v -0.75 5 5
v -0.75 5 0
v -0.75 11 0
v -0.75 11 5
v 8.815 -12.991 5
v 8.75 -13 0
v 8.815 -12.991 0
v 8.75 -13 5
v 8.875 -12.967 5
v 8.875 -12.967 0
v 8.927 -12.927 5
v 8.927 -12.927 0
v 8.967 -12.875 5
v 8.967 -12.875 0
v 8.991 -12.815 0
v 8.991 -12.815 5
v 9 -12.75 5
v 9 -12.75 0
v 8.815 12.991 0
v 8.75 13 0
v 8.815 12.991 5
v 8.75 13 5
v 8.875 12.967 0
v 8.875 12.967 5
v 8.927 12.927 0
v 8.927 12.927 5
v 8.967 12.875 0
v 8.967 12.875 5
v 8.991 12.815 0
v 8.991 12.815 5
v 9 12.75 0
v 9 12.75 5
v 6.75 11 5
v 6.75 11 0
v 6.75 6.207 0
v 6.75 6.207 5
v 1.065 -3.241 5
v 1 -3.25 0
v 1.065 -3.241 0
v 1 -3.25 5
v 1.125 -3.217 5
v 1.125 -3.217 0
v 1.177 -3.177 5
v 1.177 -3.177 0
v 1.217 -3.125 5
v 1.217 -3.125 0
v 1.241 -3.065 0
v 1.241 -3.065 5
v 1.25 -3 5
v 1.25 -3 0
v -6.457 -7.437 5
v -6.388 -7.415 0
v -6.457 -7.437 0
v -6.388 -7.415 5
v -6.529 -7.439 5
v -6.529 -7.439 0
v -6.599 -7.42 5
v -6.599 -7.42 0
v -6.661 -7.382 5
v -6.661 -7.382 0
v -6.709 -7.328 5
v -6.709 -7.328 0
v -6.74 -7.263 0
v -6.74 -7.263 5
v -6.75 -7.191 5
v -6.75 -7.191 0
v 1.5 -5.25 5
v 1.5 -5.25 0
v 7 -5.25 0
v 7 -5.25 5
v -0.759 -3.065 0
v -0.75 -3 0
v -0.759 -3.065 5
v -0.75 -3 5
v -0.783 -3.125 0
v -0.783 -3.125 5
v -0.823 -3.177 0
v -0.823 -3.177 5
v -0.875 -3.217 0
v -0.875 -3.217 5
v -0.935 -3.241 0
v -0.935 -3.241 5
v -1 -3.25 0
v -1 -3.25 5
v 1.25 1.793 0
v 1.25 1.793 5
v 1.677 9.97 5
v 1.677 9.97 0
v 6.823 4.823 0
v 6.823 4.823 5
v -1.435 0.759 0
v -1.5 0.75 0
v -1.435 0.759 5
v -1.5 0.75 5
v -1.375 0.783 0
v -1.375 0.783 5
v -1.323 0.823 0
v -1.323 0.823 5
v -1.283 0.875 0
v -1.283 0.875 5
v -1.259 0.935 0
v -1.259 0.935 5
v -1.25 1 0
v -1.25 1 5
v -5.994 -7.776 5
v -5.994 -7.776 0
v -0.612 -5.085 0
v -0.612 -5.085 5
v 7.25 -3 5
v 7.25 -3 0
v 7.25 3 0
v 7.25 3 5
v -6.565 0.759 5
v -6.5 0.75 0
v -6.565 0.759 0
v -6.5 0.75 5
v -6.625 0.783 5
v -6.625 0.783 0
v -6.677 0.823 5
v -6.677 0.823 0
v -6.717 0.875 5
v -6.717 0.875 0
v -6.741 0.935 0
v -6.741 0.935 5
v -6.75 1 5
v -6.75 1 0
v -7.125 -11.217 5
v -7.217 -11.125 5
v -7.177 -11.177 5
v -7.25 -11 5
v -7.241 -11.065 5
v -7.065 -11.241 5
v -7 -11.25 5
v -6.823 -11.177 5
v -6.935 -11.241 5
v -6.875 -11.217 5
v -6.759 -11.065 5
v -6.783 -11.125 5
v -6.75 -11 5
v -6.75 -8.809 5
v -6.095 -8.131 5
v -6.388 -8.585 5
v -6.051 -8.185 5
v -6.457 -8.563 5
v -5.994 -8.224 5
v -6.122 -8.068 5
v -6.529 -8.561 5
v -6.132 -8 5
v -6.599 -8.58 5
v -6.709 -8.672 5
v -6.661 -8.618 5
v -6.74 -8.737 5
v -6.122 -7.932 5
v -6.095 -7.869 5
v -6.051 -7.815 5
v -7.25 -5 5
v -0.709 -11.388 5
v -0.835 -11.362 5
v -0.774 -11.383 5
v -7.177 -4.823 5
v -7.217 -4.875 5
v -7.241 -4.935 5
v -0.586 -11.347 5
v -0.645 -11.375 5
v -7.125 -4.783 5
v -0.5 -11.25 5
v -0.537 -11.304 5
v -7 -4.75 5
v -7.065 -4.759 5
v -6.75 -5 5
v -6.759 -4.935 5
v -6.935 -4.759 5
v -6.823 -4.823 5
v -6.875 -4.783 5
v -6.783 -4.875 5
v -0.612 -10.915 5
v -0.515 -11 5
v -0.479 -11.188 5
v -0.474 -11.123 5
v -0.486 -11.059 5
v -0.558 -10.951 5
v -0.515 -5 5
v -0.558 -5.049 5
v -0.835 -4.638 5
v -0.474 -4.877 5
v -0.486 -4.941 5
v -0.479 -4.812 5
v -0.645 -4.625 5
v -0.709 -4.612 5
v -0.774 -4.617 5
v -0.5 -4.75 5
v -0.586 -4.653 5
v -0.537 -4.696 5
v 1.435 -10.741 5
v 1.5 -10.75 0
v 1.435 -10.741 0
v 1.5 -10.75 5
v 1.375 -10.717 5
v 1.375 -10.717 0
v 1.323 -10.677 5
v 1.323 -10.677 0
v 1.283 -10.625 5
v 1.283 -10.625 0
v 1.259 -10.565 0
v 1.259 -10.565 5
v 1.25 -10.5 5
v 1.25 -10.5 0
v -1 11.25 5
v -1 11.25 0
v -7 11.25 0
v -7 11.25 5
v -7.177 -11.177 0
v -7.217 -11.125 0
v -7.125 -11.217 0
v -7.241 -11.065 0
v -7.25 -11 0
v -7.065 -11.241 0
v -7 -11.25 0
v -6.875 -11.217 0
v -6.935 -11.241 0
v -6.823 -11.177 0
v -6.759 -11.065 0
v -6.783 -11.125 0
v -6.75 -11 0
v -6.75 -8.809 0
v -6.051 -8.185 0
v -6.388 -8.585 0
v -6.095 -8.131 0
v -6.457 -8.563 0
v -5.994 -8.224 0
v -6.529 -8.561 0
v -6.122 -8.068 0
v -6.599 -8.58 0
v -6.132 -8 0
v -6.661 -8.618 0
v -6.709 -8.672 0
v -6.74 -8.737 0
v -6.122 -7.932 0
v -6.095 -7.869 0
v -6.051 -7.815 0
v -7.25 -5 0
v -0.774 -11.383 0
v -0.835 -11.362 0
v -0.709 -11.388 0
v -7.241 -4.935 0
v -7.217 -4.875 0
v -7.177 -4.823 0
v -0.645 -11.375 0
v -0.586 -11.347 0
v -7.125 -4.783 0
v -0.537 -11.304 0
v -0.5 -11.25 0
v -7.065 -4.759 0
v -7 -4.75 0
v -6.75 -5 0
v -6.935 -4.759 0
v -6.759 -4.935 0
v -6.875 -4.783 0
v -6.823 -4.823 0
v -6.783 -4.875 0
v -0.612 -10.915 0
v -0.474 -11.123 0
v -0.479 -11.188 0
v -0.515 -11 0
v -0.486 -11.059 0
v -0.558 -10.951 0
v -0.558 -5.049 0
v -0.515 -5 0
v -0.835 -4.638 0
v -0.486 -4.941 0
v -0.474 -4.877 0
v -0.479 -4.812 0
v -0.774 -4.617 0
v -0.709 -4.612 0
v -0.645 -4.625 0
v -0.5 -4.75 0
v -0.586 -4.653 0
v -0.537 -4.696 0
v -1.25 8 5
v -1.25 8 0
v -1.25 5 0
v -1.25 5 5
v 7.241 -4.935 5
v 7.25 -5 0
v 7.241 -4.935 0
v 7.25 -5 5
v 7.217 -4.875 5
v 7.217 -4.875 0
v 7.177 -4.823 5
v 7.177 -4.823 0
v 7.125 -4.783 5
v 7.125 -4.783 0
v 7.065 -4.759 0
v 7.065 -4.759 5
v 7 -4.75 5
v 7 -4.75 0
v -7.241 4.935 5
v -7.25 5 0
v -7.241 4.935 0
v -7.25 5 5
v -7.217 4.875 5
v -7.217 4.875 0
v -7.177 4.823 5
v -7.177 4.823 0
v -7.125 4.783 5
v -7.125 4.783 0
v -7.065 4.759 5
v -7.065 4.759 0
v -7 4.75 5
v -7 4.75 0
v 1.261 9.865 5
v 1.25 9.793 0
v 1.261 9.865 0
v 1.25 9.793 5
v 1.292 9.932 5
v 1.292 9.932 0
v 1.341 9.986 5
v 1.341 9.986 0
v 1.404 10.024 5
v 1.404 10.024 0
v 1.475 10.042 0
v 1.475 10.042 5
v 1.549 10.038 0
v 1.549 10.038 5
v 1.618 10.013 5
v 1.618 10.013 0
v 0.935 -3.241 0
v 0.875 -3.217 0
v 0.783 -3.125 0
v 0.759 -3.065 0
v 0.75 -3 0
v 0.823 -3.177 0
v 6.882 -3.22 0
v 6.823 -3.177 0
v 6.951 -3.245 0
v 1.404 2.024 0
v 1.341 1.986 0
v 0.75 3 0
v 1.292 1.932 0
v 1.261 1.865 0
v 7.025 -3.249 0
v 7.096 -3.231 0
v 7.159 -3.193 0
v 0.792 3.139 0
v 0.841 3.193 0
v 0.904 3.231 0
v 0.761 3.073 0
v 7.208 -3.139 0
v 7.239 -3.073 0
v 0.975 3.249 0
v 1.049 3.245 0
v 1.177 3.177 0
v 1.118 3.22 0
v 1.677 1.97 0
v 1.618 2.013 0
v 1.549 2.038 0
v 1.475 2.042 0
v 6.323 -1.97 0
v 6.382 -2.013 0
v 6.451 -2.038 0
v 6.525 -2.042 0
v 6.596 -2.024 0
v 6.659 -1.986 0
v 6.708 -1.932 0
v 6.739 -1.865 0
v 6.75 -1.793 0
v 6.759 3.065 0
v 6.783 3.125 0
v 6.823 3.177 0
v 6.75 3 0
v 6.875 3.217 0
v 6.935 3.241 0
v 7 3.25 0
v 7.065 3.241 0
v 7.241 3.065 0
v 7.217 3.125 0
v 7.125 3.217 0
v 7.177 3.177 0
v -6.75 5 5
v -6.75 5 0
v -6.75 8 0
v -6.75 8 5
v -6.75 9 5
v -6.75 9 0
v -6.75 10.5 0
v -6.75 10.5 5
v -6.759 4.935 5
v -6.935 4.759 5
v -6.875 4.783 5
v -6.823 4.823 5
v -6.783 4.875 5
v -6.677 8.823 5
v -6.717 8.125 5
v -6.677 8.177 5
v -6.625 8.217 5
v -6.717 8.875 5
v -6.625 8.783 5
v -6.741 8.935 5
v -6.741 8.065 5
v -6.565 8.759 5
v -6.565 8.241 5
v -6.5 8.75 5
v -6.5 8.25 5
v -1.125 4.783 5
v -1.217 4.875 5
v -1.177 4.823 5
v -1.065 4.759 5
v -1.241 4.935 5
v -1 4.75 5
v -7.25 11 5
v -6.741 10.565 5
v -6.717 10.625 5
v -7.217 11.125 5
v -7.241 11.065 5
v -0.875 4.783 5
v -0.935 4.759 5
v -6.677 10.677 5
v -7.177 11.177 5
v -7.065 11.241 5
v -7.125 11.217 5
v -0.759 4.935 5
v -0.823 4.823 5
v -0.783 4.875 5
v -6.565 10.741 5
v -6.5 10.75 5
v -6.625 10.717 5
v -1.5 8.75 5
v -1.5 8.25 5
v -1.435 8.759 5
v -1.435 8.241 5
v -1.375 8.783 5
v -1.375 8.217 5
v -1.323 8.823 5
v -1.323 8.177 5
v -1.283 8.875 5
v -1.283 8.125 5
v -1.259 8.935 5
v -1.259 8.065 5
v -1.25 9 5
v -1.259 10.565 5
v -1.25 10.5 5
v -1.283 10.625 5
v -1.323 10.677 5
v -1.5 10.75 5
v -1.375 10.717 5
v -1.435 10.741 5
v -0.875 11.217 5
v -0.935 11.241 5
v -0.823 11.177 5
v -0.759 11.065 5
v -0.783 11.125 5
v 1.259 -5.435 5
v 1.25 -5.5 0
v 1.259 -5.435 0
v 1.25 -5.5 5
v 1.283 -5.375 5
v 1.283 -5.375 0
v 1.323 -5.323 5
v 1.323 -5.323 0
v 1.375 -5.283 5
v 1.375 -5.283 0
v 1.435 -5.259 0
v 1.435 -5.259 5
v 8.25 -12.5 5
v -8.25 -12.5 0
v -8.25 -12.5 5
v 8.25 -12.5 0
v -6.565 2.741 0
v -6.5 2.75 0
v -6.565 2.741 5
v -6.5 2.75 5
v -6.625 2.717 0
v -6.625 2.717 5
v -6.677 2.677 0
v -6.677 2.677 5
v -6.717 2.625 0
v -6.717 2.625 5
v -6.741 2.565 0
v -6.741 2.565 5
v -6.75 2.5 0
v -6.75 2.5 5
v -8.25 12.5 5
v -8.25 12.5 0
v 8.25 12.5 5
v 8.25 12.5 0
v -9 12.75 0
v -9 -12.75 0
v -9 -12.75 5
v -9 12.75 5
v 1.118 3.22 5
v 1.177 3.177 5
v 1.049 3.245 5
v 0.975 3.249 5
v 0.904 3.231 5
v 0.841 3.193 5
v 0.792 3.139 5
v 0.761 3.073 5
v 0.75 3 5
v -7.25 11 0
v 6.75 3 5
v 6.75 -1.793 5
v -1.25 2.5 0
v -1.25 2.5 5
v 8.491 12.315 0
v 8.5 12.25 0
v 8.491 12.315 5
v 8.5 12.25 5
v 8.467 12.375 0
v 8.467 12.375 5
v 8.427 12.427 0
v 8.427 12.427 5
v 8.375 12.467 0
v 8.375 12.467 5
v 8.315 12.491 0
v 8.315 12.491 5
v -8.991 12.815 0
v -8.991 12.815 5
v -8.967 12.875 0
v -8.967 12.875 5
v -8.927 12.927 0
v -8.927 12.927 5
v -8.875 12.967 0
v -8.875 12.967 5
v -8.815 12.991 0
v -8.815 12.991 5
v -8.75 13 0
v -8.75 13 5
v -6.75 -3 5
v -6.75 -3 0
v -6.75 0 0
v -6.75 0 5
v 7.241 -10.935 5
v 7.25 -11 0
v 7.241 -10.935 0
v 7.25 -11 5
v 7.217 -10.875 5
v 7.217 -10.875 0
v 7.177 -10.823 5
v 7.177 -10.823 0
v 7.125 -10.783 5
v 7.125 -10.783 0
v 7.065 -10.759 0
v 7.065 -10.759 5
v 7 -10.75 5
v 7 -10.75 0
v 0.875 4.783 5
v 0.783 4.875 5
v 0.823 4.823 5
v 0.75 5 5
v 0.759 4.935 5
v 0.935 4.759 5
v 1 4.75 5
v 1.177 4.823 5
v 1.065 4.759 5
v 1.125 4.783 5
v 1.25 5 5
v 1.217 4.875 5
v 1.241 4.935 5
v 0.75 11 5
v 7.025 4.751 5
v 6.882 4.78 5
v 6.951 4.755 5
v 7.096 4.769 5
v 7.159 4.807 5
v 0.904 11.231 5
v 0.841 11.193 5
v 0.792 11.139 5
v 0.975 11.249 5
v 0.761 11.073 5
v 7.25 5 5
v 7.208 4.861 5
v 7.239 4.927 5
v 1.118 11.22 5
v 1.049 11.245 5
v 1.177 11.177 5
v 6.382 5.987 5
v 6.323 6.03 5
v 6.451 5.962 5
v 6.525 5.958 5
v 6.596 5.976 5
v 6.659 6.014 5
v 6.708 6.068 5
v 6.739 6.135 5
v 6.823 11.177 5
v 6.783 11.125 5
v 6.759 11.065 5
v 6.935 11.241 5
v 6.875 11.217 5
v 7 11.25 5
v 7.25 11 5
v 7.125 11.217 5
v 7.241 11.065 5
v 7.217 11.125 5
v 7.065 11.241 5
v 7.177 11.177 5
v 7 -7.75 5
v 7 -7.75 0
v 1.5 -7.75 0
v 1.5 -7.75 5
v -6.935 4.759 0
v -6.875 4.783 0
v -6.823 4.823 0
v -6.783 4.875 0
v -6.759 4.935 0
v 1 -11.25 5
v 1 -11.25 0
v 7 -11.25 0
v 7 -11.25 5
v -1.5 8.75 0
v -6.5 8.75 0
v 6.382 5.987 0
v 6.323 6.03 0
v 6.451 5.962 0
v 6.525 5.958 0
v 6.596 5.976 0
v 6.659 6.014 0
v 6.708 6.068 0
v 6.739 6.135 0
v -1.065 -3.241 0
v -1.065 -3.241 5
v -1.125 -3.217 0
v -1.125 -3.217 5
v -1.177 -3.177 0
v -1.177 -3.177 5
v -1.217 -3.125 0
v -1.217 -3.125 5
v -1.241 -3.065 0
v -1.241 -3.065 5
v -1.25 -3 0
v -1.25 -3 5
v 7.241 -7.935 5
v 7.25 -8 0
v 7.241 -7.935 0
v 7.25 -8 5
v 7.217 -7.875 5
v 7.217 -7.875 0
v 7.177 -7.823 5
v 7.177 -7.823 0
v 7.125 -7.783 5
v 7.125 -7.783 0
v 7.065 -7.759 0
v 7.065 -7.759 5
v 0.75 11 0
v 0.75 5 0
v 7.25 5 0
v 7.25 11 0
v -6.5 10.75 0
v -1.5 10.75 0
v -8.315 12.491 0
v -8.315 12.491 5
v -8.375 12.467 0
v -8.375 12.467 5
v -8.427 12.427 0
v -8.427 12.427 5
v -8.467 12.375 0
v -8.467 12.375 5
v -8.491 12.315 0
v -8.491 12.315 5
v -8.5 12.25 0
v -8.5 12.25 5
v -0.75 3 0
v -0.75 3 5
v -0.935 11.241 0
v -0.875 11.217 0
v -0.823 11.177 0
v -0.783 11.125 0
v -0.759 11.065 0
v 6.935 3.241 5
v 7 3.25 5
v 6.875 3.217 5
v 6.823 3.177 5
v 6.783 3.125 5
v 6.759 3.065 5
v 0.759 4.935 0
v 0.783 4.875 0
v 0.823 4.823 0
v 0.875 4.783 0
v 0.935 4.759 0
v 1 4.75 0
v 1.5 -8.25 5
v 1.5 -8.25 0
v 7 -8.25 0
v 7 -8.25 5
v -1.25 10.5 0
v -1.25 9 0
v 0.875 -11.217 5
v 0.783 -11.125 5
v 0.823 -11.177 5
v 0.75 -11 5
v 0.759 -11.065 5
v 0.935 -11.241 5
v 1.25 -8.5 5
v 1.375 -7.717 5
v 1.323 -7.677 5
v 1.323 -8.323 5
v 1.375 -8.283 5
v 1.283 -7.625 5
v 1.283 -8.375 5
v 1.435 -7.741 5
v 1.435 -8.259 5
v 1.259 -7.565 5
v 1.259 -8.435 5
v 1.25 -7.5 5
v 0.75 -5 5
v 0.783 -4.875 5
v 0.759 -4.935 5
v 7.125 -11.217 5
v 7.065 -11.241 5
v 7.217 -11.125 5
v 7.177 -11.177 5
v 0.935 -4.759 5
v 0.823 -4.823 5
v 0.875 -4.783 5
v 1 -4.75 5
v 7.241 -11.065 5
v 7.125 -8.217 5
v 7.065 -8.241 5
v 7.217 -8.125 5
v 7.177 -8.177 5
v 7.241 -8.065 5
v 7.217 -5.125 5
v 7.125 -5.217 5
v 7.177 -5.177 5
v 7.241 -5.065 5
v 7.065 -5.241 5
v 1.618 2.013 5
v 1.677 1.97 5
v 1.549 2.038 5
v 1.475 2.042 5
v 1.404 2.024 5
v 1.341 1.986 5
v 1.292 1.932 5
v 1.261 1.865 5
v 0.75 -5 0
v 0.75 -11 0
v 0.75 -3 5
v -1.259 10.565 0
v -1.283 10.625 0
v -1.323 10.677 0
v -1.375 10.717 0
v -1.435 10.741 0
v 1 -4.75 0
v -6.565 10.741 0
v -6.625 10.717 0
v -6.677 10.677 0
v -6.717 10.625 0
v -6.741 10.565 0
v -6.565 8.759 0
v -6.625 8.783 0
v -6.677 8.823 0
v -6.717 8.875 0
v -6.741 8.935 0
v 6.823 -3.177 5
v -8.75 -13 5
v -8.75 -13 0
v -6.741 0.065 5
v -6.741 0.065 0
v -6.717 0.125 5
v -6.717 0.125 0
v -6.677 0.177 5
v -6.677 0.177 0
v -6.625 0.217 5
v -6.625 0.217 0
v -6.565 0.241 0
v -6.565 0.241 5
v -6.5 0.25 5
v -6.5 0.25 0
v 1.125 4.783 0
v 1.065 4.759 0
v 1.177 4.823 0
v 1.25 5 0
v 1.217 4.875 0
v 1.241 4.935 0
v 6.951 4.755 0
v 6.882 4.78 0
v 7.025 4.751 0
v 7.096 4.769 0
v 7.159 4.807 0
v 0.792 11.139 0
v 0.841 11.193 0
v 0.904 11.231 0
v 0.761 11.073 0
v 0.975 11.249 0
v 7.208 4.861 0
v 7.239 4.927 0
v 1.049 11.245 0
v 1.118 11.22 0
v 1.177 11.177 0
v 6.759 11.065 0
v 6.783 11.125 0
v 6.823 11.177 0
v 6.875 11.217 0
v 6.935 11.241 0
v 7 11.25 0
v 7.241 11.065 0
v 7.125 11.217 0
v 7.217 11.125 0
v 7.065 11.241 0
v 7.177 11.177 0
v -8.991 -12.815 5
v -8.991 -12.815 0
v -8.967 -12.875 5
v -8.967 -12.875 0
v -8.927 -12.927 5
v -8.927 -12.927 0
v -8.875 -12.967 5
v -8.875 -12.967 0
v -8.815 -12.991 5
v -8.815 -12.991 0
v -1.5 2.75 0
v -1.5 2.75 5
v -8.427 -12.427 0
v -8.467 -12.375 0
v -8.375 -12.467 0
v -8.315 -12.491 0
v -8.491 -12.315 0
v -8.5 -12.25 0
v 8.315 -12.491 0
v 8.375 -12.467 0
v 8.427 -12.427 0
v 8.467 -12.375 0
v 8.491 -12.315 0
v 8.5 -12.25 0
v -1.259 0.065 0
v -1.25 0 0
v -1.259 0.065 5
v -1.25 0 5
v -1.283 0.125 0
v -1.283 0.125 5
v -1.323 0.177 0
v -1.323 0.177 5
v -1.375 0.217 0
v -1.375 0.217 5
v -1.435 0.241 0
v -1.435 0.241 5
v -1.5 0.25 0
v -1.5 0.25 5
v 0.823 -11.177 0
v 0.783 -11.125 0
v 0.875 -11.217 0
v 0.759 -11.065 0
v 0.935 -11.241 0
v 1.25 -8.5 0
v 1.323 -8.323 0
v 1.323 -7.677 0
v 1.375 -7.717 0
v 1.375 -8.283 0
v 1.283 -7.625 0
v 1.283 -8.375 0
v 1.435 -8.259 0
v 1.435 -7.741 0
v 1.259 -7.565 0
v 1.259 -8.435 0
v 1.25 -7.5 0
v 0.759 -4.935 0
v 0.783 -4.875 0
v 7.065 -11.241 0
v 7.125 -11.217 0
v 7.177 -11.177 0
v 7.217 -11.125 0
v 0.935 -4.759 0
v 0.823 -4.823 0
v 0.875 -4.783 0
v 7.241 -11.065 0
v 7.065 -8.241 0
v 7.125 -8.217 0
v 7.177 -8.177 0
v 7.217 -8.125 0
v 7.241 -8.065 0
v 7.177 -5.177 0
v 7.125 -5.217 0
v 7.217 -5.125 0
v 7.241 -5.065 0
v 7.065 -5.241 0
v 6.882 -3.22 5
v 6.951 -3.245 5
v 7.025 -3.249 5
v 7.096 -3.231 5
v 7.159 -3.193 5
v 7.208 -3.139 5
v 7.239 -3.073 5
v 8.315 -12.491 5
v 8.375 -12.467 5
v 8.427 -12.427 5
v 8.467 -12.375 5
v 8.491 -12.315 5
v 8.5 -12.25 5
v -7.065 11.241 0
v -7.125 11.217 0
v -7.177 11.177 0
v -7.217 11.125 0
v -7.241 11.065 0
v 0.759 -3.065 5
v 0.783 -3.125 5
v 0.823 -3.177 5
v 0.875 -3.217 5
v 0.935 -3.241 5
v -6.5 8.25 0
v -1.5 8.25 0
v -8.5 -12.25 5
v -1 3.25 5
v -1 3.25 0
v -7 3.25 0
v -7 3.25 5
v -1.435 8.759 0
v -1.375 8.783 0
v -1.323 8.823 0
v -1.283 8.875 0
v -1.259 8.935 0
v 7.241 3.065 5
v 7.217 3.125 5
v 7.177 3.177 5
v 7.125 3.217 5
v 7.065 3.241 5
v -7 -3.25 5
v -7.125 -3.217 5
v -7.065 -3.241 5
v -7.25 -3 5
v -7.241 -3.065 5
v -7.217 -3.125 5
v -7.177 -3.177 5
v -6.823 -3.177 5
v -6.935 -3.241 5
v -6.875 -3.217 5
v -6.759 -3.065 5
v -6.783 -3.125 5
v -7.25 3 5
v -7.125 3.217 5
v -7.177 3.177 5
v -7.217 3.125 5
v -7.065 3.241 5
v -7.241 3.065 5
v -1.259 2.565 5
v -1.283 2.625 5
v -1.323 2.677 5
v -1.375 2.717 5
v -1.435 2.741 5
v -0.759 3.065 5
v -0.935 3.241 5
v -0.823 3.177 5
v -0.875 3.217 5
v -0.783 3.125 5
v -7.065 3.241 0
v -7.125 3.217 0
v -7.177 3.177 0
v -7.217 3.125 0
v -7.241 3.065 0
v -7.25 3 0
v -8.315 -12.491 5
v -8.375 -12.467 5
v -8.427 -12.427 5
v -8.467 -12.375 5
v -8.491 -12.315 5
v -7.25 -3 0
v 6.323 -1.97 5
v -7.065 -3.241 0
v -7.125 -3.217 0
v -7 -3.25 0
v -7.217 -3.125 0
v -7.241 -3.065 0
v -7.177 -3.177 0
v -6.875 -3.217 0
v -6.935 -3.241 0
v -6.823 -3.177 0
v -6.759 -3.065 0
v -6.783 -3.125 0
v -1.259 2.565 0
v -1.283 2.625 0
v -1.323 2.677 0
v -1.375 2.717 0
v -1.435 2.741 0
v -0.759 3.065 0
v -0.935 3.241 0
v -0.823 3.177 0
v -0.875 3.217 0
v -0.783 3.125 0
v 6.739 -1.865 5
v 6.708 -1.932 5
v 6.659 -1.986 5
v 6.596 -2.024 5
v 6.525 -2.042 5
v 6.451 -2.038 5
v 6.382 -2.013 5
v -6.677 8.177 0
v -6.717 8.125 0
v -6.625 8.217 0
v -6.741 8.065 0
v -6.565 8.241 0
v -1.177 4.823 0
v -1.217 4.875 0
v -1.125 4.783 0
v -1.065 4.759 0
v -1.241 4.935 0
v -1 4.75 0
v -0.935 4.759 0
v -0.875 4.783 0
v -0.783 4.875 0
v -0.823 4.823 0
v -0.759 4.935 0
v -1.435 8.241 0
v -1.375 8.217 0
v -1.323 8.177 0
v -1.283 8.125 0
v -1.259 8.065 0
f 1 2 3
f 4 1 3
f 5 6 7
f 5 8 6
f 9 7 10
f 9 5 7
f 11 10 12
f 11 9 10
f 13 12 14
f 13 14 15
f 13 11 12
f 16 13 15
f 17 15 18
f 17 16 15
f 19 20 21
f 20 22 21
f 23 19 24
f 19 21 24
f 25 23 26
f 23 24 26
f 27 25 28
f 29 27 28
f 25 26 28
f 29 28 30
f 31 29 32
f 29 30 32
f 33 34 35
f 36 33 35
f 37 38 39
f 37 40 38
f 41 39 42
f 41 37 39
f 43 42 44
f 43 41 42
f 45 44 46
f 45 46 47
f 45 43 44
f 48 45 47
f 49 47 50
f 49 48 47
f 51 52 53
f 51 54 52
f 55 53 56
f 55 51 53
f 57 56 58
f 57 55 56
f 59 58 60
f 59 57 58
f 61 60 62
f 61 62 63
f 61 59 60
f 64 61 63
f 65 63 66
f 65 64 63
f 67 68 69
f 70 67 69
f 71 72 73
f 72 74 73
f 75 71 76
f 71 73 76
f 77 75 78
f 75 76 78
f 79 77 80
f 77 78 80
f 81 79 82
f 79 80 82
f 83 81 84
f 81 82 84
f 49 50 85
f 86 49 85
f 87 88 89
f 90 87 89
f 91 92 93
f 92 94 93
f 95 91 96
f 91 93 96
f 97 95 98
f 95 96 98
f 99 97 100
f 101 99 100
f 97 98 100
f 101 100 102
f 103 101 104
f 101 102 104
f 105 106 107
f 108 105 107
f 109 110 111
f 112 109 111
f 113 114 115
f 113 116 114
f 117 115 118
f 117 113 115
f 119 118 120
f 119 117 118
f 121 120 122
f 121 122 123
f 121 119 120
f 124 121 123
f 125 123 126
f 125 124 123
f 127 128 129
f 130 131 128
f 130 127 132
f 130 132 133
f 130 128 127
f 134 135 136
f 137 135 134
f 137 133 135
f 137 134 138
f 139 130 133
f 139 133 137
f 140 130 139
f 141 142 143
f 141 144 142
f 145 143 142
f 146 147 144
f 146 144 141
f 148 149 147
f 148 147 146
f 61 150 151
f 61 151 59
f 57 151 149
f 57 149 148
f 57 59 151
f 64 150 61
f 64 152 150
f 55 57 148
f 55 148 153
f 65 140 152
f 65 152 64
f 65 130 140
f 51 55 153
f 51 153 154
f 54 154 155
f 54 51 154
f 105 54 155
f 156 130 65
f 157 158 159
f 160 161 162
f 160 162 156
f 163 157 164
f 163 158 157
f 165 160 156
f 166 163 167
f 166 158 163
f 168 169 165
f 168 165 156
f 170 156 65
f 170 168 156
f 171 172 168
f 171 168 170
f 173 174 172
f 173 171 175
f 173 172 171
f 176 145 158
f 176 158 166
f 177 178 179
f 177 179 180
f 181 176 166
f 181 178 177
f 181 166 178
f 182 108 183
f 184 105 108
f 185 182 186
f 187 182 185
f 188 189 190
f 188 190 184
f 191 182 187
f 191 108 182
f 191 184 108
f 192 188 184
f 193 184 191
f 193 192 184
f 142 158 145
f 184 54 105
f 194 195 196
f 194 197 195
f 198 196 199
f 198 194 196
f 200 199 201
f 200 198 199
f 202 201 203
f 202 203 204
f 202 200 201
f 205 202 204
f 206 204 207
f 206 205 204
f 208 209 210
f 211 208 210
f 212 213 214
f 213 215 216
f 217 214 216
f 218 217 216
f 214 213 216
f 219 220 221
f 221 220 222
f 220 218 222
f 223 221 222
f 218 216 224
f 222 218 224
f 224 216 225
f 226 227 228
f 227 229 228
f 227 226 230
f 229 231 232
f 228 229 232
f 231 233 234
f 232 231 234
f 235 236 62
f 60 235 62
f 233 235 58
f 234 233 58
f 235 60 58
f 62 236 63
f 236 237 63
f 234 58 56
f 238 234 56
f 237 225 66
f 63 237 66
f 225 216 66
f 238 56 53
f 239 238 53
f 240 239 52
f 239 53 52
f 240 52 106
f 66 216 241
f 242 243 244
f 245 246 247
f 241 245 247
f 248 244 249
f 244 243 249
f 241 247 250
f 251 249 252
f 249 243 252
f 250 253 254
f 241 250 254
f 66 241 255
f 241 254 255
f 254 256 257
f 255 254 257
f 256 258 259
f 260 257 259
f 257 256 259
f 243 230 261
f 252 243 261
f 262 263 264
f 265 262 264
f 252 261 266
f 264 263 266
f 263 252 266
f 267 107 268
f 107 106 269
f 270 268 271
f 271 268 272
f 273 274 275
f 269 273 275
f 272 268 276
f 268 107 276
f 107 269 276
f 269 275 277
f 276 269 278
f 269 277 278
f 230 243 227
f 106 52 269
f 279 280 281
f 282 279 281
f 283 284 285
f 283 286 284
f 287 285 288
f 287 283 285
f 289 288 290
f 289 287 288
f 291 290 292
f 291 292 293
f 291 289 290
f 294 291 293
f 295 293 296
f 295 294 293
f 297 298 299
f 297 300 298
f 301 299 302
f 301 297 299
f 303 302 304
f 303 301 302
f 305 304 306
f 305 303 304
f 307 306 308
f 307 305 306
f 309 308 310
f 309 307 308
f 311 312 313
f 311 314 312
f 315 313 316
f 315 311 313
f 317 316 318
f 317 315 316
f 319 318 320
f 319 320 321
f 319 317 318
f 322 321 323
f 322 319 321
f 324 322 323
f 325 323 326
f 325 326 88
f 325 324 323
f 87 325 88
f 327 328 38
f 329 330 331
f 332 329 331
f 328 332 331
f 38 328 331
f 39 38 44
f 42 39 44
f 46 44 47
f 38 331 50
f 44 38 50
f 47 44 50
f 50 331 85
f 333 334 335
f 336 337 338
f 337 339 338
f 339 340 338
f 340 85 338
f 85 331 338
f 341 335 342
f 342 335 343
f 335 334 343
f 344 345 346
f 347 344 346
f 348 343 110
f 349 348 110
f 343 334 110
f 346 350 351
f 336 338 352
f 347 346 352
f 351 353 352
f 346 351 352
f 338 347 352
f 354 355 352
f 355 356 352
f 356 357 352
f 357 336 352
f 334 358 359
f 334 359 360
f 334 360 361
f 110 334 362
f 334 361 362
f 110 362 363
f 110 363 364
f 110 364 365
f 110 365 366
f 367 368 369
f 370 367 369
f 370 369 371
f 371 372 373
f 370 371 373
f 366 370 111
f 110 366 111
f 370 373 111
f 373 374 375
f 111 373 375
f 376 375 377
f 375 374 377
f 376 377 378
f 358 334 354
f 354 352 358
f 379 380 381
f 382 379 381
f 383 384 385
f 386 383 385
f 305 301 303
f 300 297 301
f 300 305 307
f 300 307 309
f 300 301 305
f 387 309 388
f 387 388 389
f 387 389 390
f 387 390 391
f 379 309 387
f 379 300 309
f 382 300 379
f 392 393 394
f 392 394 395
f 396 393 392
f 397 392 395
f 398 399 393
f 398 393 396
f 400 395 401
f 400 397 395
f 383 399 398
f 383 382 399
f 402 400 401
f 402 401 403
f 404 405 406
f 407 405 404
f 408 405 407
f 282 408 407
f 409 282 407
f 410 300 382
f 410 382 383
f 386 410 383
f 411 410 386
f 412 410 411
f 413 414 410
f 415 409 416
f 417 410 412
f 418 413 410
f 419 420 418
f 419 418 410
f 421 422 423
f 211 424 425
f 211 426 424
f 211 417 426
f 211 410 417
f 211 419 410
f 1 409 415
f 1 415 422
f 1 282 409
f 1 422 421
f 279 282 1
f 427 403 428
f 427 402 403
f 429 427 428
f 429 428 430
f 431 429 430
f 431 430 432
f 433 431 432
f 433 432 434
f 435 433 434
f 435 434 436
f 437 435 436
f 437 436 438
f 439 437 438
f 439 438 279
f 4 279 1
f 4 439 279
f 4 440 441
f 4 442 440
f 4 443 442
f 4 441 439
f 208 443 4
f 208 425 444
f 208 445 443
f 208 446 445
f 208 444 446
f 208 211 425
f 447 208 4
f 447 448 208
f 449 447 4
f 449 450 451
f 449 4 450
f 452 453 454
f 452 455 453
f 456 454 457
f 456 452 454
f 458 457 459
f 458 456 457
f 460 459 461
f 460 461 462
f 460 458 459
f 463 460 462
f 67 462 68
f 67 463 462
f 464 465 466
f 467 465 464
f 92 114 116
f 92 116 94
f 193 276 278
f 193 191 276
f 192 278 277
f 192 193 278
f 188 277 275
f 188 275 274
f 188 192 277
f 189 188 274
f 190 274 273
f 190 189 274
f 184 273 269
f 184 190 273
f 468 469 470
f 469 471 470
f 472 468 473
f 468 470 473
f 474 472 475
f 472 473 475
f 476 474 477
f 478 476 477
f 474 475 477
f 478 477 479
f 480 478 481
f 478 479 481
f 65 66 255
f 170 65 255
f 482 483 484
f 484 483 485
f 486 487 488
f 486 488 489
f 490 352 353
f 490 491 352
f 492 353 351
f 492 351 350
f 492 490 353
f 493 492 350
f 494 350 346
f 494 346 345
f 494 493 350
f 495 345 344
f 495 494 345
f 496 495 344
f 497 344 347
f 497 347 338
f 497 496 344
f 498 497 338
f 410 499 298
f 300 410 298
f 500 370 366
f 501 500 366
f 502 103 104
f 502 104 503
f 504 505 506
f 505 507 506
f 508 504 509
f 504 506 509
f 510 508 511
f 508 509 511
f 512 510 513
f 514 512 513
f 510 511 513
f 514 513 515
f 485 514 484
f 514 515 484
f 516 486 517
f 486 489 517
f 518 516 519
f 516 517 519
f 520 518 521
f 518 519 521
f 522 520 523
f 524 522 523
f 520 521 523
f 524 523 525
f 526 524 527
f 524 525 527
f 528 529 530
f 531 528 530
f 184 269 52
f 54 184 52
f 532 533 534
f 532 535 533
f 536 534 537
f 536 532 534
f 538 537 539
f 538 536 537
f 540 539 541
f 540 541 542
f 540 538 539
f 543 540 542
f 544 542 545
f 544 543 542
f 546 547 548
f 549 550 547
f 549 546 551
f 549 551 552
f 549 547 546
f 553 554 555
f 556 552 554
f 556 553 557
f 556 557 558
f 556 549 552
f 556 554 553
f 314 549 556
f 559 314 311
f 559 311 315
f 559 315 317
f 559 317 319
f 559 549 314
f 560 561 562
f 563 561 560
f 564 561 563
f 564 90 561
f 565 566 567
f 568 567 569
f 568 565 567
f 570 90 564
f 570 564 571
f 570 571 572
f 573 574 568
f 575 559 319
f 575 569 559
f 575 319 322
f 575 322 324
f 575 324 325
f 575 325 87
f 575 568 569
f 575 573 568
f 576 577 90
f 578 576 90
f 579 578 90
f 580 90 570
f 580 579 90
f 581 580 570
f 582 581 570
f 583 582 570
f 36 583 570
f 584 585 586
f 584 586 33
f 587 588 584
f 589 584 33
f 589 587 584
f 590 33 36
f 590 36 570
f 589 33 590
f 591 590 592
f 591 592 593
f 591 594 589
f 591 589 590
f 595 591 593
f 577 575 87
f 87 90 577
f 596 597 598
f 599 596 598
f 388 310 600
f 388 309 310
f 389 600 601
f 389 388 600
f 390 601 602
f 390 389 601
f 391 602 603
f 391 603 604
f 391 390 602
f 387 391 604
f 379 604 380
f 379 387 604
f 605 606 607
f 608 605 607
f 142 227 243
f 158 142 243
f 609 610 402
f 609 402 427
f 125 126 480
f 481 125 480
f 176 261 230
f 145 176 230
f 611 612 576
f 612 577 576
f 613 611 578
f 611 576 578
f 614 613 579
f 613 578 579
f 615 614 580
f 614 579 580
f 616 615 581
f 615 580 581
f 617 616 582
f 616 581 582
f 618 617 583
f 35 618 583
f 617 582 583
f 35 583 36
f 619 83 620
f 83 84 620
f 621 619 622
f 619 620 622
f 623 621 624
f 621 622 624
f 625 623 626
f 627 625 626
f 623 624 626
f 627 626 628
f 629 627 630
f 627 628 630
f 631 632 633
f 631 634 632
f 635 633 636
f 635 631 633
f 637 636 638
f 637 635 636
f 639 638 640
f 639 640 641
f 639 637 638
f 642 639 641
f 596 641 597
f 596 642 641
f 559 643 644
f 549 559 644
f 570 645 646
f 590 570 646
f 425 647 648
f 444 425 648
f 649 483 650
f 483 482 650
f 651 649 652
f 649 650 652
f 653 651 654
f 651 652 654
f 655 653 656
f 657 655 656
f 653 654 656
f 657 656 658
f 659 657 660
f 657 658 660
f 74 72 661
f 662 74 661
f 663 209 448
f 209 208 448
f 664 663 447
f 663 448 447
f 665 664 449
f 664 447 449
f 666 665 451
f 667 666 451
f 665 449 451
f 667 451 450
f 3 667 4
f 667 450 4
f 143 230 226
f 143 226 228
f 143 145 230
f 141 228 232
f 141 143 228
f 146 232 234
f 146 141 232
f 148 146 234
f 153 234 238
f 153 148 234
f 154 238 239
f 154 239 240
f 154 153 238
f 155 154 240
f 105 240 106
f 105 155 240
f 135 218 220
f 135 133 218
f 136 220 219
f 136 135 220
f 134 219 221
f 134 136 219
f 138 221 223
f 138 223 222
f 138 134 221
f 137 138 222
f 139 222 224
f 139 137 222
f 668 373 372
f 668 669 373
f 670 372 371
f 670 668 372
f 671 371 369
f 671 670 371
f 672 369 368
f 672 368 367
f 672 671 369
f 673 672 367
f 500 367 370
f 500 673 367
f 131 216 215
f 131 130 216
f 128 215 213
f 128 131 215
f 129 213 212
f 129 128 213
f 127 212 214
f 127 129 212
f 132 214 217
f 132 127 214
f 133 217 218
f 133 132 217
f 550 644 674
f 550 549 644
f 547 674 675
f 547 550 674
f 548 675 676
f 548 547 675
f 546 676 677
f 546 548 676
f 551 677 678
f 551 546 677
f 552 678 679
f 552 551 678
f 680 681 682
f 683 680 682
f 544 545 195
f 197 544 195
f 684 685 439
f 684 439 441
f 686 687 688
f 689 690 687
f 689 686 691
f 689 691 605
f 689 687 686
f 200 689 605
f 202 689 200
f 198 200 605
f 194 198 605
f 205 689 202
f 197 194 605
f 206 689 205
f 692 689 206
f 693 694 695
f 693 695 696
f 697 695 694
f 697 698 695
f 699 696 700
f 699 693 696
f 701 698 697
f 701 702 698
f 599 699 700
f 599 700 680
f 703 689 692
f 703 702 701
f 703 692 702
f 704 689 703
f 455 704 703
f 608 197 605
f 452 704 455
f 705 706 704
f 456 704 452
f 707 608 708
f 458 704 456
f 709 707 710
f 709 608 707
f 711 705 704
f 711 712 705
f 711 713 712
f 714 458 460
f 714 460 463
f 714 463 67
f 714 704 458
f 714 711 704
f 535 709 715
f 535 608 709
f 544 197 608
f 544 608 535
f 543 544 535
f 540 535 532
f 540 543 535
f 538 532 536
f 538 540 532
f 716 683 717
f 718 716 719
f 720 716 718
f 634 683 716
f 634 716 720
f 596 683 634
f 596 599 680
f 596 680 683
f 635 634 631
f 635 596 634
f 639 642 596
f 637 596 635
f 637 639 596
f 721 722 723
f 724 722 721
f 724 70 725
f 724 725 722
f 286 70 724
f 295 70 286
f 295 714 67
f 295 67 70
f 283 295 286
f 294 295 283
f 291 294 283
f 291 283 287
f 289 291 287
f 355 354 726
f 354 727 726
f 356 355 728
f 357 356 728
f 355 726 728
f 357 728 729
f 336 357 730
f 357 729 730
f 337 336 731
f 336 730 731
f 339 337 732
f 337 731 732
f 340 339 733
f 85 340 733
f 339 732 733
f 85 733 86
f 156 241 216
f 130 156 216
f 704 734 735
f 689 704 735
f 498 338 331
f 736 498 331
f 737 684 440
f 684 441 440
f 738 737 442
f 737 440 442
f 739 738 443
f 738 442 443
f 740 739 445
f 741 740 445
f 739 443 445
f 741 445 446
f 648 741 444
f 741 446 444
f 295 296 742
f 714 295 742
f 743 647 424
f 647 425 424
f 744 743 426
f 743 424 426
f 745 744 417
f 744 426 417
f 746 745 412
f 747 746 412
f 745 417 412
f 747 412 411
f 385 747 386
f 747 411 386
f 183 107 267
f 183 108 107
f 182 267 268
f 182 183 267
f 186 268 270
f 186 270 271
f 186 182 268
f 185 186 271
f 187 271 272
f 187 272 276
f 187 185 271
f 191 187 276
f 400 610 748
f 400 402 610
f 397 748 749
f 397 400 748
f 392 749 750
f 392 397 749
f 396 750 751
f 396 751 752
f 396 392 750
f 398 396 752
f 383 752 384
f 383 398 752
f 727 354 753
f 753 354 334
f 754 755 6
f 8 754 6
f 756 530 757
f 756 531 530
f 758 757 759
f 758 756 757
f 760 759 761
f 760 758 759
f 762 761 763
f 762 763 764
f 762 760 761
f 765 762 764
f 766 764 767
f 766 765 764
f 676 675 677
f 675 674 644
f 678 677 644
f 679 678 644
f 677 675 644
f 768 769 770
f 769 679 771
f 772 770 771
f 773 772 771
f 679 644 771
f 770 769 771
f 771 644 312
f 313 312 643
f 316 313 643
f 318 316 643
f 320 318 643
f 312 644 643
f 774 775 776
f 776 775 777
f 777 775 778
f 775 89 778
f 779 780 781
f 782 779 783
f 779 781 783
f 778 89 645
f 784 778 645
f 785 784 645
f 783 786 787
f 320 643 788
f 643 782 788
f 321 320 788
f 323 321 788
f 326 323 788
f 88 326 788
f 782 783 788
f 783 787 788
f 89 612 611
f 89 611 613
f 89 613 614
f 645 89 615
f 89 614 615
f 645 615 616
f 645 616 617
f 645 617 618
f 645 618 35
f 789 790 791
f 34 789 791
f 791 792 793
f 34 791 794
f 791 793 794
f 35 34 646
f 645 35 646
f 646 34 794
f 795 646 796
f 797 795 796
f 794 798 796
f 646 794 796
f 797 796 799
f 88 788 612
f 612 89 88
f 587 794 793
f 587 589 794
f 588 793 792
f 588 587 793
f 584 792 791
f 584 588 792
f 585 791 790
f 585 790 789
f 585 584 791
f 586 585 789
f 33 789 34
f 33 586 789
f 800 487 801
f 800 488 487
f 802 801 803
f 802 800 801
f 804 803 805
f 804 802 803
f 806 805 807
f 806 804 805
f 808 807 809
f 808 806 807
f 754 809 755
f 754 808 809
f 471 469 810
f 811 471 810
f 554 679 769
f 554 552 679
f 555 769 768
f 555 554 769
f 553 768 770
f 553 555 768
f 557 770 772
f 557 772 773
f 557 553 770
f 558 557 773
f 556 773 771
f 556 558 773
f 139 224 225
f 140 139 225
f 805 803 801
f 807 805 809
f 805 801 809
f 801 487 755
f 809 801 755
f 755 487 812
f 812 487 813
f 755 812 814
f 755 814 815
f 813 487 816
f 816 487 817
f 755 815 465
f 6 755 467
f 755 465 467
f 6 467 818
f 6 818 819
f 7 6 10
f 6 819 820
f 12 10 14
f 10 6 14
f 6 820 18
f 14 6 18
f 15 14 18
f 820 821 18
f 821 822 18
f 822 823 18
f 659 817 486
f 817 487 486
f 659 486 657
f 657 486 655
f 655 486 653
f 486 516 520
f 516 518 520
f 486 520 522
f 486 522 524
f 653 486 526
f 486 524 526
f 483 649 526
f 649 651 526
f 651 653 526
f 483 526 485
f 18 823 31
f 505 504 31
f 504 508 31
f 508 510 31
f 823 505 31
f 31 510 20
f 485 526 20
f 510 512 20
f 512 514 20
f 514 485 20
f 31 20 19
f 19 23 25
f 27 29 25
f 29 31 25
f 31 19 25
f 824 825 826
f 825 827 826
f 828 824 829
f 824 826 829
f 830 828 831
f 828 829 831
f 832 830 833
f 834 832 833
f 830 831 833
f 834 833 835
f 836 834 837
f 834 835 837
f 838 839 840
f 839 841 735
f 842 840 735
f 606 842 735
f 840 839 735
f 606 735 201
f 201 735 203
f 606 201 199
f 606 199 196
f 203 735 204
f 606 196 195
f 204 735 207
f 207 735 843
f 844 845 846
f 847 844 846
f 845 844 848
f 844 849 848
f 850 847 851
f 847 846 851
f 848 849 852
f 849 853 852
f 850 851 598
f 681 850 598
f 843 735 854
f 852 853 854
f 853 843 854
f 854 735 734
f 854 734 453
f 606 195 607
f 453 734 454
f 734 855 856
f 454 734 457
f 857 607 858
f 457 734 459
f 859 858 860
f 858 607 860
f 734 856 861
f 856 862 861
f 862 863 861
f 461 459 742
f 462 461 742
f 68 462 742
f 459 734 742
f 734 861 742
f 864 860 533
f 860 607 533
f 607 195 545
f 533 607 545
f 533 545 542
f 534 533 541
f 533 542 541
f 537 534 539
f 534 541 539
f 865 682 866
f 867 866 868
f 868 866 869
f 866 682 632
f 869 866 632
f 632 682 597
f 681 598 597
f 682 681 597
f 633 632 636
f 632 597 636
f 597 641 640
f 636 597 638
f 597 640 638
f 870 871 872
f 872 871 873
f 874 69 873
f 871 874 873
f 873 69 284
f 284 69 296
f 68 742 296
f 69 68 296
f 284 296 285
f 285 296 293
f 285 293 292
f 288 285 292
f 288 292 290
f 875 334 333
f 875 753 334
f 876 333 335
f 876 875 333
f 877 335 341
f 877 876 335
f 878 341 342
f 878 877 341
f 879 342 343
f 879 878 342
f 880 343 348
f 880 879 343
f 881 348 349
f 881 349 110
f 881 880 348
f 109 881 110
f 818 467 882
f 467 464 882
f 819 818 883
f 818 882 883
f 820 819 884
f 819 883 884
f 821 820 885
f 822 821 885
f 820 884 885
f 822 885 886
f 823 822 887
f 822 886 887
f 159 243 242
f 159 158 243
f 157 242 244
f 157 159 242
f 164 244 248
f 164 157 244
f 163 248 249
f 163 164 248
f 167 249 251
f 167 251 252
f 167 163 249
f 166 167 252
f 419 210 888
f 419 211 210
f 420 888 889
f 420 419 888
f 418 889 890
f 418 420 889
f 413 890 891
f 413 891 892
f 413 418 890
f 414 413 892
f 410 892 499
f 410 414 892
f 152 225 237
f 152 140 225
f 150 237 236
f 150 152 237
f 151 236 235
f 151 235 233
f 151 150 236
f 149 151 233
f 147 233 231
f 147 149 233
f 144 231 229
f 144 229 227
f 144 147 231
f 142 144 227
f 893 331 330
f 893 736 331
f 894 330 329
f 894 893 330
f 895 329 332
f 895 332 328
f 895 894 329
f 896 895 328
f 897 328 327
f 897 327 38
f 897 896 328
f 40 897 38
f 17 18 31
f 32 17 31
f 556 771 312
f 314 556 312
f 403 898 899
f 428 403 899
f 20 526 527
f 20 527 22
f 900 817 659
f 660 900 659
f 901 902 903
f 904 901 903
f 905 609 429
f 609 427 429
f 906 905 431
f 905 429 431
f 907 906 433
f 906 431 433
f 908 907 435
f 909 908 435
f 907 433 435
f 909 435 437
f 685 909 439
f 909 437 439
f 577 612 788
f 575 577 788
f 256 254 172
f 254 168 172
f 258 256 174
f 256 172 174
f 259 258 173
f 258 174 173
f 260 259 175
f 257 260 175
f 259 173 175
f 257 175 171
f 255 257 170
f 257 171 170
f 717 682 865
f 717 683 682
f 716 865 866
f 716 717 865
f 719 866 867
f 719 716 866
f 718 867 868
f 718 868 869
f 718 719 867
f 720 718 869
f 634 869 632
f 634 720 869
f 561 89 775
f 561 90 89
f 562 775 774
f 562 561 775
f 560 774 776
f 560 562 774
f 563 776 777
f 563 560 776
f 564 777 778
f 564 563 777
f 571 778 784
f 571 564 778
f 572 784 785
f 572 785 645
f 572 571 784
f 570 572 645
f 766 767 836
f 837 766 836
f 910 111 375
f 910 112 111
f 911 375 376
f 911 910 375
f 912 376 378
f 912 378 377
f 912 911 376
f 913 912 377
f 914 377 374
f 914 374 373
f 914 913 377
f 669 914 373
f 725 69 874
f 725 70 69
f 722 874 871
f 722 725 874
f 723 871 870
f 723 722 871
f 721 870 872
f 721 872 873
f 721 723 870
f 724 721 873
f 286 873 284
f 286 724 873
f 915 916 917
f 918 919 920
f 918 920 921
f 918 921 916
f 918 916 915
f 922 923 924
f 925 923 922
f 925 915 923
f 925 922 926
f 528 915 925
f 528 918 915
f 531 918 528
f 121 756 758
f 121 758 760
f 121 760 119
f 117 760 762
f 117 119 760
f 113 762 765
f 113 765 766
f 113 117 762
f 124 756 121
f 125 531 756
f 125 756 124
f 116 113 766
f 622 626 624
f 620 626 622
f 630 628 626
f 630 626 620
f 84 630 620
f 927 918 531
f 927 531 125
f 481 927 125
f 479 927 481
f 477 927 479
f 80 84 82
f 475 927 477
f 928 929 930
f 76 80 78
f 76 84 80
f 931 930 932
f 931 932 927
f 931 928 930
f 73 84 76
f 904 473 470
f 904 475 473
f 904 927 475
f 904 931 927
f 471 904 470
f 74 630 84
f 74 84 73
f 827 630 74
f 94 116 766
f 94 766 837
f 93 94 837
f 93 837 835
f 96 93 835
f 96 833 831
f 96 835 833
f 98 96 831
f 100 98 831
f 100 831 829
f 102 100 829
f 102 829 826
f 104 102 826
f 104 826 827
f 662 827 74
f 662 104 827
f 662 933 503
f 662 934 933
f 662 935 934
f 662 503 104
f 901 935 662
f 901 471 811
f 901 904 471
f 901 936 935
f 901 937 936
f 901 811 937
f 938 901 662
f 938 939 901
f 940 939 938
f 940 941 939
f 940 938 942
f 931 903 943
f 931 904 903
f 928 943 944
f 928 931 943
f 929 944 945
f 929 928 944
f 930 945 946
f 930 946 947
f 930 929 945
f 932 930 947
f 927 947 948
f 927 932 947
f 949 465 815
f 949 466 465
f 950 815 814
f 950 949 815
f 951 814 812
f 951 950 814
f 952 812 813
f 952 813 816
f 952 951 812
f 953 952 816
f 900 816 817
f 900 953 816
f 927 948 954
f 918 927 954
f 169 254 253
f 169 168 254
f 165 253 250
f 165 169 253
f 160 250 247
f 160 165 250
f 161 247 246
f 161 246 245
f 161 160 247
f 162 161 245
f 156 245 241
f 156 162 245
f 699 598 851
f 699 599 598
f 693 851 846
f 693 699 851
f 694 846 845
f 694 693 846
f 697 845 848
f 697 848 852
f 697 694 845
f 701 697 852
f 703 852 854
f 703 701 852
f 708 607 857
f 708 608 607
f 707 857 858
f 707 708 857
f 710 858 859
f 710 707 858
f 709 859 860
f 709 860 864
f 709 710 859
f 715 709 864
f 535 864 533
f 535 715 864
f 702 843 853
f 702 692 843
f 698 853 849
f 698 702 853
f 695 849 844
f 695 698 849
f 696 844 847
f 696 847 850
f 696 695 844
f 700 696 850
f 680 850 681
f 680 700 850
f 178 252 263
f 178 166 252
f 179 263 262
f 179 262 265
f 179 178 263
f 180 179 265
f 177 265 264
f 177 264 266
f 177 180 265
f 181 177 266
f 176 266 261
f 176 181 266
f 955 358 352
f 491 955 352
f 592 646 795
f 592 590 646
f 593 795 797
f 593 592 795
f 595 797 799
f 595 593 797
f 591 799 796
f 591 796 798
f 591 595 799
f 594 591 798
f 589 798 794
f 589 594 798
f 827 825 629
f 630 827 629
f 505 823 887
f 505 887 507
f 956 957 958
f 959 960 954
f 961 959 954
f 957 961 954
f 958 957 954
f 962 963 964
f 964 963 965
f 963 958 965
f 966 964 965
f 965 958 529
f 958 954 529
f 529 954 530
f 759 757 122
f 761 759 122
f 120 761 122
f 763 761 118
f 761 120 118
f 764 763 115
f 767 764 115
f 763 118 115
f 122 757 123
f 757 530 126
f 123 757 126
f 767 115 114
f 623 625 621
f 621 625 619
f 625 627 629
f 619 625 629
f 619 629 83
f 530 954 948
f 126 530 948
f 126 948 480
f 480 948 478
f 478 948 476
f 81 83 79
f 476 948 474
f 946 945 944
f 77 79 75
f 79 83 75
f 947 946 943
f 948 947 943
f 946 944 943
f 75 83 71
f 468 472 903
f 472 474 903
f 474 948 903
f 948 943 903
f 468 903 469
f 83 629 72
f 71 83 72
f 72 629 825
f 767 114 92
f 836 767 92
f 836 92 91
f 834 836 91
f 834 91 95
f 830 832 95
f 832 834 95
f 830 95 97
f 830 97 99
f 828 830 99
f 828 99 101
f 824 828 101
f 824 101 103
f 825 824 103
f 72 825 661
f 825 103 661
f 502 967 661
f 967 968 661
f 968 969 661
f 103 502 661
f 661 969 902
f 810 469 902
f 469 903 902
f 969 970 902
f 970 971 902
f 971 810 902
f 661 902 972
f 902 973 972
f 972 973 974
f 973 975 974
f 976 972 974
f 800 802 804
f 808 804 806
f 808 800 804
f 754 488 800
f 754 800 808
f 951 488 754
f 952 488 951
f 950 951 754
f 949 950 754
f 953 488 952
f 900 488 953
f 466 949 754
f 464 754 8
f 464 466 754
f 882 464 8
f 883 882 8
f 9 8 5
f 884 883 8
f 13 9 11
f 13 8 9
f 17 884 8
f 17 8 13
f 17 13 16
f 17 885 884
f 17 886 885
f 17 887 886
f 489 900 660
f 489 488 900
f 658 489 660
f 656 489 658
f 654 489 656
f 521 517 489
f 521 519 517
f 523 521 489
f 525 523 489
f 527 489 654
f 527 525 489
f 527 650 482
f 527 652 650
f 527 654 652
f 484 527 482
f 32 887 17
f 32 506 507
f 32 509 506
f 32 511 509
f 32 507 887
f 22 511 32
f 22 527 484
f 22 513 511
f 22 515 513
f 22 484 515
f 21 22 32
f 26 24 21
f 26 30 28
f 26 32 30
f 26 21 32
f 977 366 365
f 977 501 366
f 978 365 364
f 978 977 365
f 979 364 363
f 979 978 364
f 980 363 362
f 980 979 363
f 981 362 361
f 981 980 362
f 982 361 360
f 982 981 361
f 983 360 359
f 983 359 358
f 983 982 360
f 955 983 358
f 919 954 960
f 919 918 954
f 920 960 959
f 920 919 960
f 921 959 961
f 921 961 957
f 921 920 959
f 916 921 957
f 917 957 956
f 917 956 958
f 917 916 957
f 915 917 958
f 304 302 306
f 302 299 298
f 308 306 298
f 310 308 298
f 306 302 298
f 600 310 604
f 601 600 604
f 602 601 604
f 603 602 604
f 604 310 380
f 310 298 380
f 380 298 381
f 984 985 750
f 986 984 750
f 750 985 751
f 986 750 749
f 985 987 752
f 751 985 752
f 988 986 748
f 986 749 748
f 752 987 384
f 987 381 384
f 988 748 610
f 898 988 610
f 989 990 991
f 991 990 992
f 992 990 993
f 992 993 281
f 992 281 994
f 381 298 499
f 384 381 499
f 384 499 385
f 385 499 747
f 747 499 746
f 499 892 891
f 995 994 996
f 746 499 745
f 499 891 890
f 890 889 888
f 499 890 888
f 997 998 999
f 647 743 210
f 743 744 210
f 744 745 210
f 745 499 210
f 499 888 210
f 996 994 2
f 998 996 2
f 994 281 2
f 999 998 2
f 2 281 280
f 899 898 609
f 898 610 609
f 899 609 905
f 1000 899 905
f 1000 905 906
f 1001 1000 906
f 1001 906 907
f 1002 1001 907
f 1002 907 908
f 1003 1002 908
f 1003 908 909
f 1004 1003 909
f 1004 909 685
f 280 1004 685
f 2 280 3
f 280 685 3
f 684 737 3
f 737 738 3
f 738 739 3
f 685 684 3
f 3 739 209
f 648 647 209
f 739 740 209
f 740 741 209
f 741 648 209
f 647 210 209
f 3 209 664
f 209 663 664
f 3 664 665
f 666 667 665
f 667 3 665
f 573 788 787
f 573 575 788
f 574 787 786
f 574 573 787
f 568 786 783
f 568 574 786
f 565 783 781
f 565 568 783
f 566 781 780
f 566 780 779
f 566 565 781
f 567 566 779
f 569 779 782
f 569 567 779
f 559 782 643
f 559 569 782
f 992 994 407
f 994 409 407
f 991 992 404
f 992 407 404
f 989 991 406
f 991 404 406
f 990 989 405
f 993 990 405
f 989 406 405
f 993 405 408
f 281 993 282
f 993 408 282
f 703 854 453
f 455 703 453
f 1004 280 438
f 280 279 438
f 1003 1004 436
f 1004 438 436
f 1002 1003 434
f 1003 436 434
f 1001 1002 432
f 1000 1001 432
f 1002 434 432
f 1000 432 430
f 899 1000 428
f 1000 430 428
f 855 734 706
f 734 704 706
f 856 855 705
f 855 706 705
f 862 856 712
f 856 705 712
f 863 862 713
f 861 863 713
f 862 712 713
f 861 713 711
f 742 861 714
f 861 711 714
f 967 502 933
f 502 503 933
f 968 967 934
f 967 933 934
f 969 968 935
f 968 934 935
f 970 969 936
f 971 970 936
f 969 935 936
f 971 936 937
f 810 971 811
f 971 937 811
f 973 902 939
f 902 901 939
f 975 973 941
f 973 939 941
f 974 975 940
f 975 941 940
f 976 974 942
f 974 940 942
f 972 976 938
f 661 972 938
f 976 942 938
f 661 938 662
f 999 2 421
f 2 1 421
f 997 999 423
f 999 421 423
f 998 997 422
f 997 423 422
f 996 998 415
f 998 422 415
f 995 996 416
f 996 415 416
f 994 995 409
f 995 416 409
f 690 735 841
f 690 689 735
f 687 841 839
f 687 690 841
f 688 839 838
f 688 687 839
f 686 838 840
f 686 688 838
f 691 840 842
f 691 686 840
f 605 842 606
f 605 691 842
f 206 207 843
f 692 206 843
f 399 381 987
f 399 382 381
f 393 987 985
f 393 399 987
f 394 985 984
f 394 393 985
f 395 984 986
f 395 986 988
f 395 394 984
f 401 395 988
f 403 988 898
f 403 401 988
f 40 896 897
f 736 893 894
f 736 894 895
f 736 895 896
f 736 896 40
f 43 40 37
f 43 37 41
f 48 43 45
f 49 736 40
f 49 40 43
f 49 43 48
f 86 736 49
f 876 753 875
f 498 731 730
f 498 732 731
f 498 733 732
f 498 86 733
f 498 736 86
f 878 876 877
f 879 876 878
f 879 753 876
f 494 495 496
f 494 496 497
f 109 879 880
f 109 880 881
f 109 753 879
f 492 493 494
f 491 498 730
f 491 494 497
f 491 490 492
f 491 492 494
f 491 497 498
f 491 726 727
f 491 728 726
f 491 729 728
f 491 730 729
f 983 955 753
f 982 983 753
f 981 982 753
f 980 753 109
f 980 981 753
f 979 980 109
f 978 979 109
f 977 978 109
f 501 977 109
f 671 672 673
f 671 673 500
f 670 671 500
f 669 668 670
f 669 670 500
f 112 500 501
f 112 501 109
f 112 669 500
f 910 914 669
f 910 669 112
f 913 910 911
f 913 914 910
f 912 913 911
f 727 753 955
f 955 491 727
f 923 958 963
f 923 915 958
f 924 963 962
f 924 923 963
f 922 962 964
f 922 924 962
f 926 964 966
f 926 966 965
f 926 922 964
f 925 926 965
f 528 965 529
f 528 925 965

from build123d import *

# Parameters (mm, degrees)
F1_W     = 18
F1_H     = 26
F1_W_2   = 17
F1_H_2   = 25
F2_DEPTH = 5
F1_W_3   = 6
F1_H_3   = 2.5
F1_W_4   = 5.5
F1_H_4   = 2
F3_R     = 0.25
F4_R     = 0.24999
F5_R     = 0.24999
F6_R     = 0.24999
F7_R     = 0.24999
F8_R     = 0.24999
F9_R     = 0.24999


# Not quite as in the source:
# - a fillet or chamfer is up to 0.001 mm smaller than in the source, because OpenCascade refuses the exact size


with BuildPart() as f2:
    # F1 (on face) → F2 (new body)
    with BuildSketch(Plane.XY):
        Rectangle(F1_W, F1_H)
        Rectangle(F1_W_2, F1_H_2, mode=Mode.SUBTRACT)
    extrude(amount=F2_DEPTH)

    # F3
    f3_edges = [f2.edges().sort_by_distance(p)[0] for p in [
        (9, 13, 2.5),
        (-9, 13, 2.5),
        (8.5, 12.5, 2.5),
        (-8.5, 12.5, 2.5),
        (9, -13, 2.5),
        (-9, -13, 2.5),
        (8.5, -12.5, 2.5),
        (-8.5, -12.5, 2.5),
    ]]
    fillet(f3_edges, radius=F3_R)


with BuildPart() as f2b:
    # F1 (on face) → F2, piece 2 (new body)
    with BuildSketch(Plane.XY):
        Polygon((-0.75, 5), (-0.75, 11.25), (-7.25, 11.25), (-7.25, 5), (-7.25, 4.75), (-6.75, 4.75), (-6.75, 5), (-6.75, 8.25), (-1.25, 8.25), (-1.25, 5), (-1, 5), align=None)
        with Locations((-4, 9.75)):
            Rectangle(F1_W_3, F1_H_3, mode=Mode.SUBTRACT)
        Polygon((-0.75, 4.75), (-0.75, 5), (-1, 5), (-1.25, 5), (-1.25, 4.75), align=None)
        with Locations((-4, 9.75)):
            Rectangle(F1_W_3, F1_H_3)
        with Locations((-4, 9.75)):
            Rectangle(F1_W_4, F1_H_4, mode=Mode.SUBTRACT)
    extrude(amount=F2_DEPTH)

    # F4 (radius 0.25 in the source; OpenCascade refuses exactly that, so slightly less here)
    f4_edges = [f2b.edges().sort_by_distance(p)[0] for p in [
        (-6.75, 10.75, 2.5),
        (-6.75, 8.25, 2.5),
        (-6.75, 4.75, 2.5),
        (-0.75, 4.75, 2.5),
        (-7.25, 4.75, 2.5),
        (-1.25, 4.75, 2.5),
        (-0.75, 11.25, 2.5),
        (-1.25, 10.75, 2.5),
        (-1.25, 8.25, 2.5),
        (-7.25, 11.25, 2.5),
        (-1.25, 8.75, 2.5),
        (-6.75, 8.75, 2.5),
    ]]
    fillet(f4_edges, radius=F4_R)


with BuildPart() as f2c:
    # F1 (on face) → F2, piece 3 (new body)
    with BuildSketch(Plane.XY):
        Polygon((6.75, 11), (6.75, 5.6035533906), (0.75, 11.6035533906), (0.75, 5), (0.75, 4.75), (1.25, 4.75), (1.25, 5), (1.25, 10.3964466094), (7.25, 4.3964466094), (7.25, 11), (7.25, 11.25), (6.75, 11.25), align=None)
    extrude(amount=F2_DEPTH)

    # F5 (radius 0.25 in the source; OpenCascade refuses exactly that, so slightly less here)
    f5_edges = [f2c.edges().sort_by_distance(p)[0] for p in [
        (7.25, 11.25, 2.5),
        (6.75, 11.25, 2.5),
        (0.75, 11.603553, 2.5),
        (7.25, 4.396447, 2.5),
        (1.25, 4.75, 2.5),
        (0.75, 4.75, 2.5),
        (6.75, 5.603553, 2.5),
        (1.25, 10.396447, 2.5),
    ]]
    fillet(f5_edges, radius=F5_R)


with BuildPart() as f2d:
    # F1 (on face) → F2, piece 4 (new body)
    with BuildSketch(Plane.XY):
        Polygon((1.25, 2.3964466094), (7.25, -3.6035533906), (7.25, 3), (7.25, 3.25), (6.75, 3.25), (6.75, 3), (6.75, -2.3964466094), (0.75, 3.6035533906), (0.75, -3), (0.75, -3.25), (1.25, -3.25), (1.25, -3), align=None)
    extrude(amount=F2_DEPTH)

    # F6 (radius 0.25 in the source; OpenCascade refuses exactly that, so slightly less here)
    f6_edges = [f2d.edges().sort_by_distance(p)[0] for p in [
        (7.25, -3.603553, 2.5),
        (1.25, -3.25, 2.5),
        (0.75, -3.25, 2.5),
        (7.25, 3.25, 2.5),
        (1.25, 2.396447, 2.5),
        (0.75, 3.603553, 2.5),
        (6.75, 3.25, 2.5),
        (6.75, -2.396447, 2.5),
    ]]
    fillet(f6_edges, radius=F6_R)


with BuildPart() as f2e:
    # F1 (on face) → F2, piece 5 (new body)
    with BuildSketch(Plane.XY):
        Polygon((-0.75, 3.25), (-7.25, 3.25), (-7.25, -3), (-7.25, -3.25), (-6.75, -3.25), (-6.75, -3), (-6.75, 0.25), (-1.25, 0.25), (-1.25, -3), (-1.25, -3.25), (-0.75, -3.25), (-0.75, -3), align=None)
        with Locations((-4, 1.75)):
            Rectangle(F1_W_3, F1_H_3, mode=Mode.SUBTRACT)
        with Locations((-4, 1.75)):
            Rectangle(F1_W_3, F1_H_3)
        with Locations((-4, 1.75)):
            Rectangle(F1_W_4, F1_H_4, mode=Mode.SUBTRACT)
    extrude(amount=F2_DEPTH)

    # F7 (radius 0.25 in the source; OpenCascade refuses exactly that, so slightly less here)
    f7_edges = [f2e.edges().sort_by_distance(p)[0] for p in [
        (-0.75, 3.25, 2.5),
        (-7.25, 3.25, 2.5),
        (-7.25, -3.25, 2.5),
        (-1.25, -3.25, 2.5),
        (-1.25, 0.75, 2.5),
        (-6.75, 0.75, 2.5),
        (-1.25, 0.25, 2.5),
        (-6.75, 0.25, 2.5),
        (-6.75, -3.25, 2.5),
        (-6.75, 2.75, 2.5),
        (-1.25, 2.75, 2.5),
        (-0.75, -3.25, 2.5),
    ]]
    fillet(f7_edges, radius=F7_R)


with BuildPart() as f2f:
    # F1 (on face) → F2, piece 6 (new body)
    with BuildSketch(Plane.XY):
        Polygon((0.75, -4.75), (0.75, -11.25), (7, -11.25), (7.25, -11.25), (7.25, -10.75), (7, -10.75), (1.25, -10.75), (1.25, -8.25), (7.25, -8.25), (7.25, -7.75), (1.25, -7.75), (1.25, -5.25), (7, -5.25), (7.25, -5.25), (7.25, -4.75), (7, -4.75), align=None)
    extrude(amount=F2_DEPTH)

    # F8 (radius 0.25 in the source; OpenCascade refuses exactly that, so slightly less here)
    f8_edges = [f2f.edges().sort_by_distance(p)[0] for p in [
        (1.25, -5.25, 2.5),
        (7.25, -5.25, 2.5),
        (7.25, -4.75, 2.5),
        (7.25, -8.25, 2.5),
        (7.25, -7.75, 2.5),
        (1.25, -8.25, 2.5),
        (7.25, -11.25, 2.5),
        (7.25, -10.75, 2.5),
        (0.75, -11.25, 2.5),
        (1.25, -10.75, 2.5),
        (1.25, -7.75, 2.5),
        (0.75, -4.75, 2.5),
    ]]
    fillet(f8_edges, radius=F8_R)


with BuildPart() as f2g:
    # F1 (on face) → F2, piece 7 (new body)
    with BuildSketch(Plane.XY):
        Polygon((-6.75, -4.75), (-7.25, -4.75), (-7.25, -11.25), (-6.75, -11.25), (-6.75, -8.4045084972), (-0.6118033989, -11.4736067977), (-0.3881966011, -11.0263932023), (-6.4409830056, -8), (-0.3881966011, -4.9736067977), (-0.6118033989, -4.5263932023), (-6.75, -7.5954915028), align=None)
    extrude(amount=F2_DEPTH)

    # F9 (radius 0.25 in the source; OpenCascade refuses exactly that, so slightly less here)
    f9_edges = [f2g.edges().sort_by_distance(p)[0] for p in [
        (-6.440983, -8, 2.5),
        (-0.388197, -4.973607, 2.5),
        (-0.611803, -4.526393, 2.5),
        (-0.388197, -11.026393, 2.5),
        (-6.75, -11.25, 2.5),
        (-7.25, -11.25, 2.5),
        (-6.75, -4.75, 2.5),
        (-0.611803, -11.473607, 2.5),
        (-6.75, -8.404508, 2.5),
        (-6.75, -7.595492, 2.5),
        (-7.25, -4.75, 2.5),
    ]]
    fillet(f9_edges, radius=F9_R)


solid = Compound([f2.part, f2b.part, f2c.part, f2d.part, f2e.part, f2f.part, f2g.part])
